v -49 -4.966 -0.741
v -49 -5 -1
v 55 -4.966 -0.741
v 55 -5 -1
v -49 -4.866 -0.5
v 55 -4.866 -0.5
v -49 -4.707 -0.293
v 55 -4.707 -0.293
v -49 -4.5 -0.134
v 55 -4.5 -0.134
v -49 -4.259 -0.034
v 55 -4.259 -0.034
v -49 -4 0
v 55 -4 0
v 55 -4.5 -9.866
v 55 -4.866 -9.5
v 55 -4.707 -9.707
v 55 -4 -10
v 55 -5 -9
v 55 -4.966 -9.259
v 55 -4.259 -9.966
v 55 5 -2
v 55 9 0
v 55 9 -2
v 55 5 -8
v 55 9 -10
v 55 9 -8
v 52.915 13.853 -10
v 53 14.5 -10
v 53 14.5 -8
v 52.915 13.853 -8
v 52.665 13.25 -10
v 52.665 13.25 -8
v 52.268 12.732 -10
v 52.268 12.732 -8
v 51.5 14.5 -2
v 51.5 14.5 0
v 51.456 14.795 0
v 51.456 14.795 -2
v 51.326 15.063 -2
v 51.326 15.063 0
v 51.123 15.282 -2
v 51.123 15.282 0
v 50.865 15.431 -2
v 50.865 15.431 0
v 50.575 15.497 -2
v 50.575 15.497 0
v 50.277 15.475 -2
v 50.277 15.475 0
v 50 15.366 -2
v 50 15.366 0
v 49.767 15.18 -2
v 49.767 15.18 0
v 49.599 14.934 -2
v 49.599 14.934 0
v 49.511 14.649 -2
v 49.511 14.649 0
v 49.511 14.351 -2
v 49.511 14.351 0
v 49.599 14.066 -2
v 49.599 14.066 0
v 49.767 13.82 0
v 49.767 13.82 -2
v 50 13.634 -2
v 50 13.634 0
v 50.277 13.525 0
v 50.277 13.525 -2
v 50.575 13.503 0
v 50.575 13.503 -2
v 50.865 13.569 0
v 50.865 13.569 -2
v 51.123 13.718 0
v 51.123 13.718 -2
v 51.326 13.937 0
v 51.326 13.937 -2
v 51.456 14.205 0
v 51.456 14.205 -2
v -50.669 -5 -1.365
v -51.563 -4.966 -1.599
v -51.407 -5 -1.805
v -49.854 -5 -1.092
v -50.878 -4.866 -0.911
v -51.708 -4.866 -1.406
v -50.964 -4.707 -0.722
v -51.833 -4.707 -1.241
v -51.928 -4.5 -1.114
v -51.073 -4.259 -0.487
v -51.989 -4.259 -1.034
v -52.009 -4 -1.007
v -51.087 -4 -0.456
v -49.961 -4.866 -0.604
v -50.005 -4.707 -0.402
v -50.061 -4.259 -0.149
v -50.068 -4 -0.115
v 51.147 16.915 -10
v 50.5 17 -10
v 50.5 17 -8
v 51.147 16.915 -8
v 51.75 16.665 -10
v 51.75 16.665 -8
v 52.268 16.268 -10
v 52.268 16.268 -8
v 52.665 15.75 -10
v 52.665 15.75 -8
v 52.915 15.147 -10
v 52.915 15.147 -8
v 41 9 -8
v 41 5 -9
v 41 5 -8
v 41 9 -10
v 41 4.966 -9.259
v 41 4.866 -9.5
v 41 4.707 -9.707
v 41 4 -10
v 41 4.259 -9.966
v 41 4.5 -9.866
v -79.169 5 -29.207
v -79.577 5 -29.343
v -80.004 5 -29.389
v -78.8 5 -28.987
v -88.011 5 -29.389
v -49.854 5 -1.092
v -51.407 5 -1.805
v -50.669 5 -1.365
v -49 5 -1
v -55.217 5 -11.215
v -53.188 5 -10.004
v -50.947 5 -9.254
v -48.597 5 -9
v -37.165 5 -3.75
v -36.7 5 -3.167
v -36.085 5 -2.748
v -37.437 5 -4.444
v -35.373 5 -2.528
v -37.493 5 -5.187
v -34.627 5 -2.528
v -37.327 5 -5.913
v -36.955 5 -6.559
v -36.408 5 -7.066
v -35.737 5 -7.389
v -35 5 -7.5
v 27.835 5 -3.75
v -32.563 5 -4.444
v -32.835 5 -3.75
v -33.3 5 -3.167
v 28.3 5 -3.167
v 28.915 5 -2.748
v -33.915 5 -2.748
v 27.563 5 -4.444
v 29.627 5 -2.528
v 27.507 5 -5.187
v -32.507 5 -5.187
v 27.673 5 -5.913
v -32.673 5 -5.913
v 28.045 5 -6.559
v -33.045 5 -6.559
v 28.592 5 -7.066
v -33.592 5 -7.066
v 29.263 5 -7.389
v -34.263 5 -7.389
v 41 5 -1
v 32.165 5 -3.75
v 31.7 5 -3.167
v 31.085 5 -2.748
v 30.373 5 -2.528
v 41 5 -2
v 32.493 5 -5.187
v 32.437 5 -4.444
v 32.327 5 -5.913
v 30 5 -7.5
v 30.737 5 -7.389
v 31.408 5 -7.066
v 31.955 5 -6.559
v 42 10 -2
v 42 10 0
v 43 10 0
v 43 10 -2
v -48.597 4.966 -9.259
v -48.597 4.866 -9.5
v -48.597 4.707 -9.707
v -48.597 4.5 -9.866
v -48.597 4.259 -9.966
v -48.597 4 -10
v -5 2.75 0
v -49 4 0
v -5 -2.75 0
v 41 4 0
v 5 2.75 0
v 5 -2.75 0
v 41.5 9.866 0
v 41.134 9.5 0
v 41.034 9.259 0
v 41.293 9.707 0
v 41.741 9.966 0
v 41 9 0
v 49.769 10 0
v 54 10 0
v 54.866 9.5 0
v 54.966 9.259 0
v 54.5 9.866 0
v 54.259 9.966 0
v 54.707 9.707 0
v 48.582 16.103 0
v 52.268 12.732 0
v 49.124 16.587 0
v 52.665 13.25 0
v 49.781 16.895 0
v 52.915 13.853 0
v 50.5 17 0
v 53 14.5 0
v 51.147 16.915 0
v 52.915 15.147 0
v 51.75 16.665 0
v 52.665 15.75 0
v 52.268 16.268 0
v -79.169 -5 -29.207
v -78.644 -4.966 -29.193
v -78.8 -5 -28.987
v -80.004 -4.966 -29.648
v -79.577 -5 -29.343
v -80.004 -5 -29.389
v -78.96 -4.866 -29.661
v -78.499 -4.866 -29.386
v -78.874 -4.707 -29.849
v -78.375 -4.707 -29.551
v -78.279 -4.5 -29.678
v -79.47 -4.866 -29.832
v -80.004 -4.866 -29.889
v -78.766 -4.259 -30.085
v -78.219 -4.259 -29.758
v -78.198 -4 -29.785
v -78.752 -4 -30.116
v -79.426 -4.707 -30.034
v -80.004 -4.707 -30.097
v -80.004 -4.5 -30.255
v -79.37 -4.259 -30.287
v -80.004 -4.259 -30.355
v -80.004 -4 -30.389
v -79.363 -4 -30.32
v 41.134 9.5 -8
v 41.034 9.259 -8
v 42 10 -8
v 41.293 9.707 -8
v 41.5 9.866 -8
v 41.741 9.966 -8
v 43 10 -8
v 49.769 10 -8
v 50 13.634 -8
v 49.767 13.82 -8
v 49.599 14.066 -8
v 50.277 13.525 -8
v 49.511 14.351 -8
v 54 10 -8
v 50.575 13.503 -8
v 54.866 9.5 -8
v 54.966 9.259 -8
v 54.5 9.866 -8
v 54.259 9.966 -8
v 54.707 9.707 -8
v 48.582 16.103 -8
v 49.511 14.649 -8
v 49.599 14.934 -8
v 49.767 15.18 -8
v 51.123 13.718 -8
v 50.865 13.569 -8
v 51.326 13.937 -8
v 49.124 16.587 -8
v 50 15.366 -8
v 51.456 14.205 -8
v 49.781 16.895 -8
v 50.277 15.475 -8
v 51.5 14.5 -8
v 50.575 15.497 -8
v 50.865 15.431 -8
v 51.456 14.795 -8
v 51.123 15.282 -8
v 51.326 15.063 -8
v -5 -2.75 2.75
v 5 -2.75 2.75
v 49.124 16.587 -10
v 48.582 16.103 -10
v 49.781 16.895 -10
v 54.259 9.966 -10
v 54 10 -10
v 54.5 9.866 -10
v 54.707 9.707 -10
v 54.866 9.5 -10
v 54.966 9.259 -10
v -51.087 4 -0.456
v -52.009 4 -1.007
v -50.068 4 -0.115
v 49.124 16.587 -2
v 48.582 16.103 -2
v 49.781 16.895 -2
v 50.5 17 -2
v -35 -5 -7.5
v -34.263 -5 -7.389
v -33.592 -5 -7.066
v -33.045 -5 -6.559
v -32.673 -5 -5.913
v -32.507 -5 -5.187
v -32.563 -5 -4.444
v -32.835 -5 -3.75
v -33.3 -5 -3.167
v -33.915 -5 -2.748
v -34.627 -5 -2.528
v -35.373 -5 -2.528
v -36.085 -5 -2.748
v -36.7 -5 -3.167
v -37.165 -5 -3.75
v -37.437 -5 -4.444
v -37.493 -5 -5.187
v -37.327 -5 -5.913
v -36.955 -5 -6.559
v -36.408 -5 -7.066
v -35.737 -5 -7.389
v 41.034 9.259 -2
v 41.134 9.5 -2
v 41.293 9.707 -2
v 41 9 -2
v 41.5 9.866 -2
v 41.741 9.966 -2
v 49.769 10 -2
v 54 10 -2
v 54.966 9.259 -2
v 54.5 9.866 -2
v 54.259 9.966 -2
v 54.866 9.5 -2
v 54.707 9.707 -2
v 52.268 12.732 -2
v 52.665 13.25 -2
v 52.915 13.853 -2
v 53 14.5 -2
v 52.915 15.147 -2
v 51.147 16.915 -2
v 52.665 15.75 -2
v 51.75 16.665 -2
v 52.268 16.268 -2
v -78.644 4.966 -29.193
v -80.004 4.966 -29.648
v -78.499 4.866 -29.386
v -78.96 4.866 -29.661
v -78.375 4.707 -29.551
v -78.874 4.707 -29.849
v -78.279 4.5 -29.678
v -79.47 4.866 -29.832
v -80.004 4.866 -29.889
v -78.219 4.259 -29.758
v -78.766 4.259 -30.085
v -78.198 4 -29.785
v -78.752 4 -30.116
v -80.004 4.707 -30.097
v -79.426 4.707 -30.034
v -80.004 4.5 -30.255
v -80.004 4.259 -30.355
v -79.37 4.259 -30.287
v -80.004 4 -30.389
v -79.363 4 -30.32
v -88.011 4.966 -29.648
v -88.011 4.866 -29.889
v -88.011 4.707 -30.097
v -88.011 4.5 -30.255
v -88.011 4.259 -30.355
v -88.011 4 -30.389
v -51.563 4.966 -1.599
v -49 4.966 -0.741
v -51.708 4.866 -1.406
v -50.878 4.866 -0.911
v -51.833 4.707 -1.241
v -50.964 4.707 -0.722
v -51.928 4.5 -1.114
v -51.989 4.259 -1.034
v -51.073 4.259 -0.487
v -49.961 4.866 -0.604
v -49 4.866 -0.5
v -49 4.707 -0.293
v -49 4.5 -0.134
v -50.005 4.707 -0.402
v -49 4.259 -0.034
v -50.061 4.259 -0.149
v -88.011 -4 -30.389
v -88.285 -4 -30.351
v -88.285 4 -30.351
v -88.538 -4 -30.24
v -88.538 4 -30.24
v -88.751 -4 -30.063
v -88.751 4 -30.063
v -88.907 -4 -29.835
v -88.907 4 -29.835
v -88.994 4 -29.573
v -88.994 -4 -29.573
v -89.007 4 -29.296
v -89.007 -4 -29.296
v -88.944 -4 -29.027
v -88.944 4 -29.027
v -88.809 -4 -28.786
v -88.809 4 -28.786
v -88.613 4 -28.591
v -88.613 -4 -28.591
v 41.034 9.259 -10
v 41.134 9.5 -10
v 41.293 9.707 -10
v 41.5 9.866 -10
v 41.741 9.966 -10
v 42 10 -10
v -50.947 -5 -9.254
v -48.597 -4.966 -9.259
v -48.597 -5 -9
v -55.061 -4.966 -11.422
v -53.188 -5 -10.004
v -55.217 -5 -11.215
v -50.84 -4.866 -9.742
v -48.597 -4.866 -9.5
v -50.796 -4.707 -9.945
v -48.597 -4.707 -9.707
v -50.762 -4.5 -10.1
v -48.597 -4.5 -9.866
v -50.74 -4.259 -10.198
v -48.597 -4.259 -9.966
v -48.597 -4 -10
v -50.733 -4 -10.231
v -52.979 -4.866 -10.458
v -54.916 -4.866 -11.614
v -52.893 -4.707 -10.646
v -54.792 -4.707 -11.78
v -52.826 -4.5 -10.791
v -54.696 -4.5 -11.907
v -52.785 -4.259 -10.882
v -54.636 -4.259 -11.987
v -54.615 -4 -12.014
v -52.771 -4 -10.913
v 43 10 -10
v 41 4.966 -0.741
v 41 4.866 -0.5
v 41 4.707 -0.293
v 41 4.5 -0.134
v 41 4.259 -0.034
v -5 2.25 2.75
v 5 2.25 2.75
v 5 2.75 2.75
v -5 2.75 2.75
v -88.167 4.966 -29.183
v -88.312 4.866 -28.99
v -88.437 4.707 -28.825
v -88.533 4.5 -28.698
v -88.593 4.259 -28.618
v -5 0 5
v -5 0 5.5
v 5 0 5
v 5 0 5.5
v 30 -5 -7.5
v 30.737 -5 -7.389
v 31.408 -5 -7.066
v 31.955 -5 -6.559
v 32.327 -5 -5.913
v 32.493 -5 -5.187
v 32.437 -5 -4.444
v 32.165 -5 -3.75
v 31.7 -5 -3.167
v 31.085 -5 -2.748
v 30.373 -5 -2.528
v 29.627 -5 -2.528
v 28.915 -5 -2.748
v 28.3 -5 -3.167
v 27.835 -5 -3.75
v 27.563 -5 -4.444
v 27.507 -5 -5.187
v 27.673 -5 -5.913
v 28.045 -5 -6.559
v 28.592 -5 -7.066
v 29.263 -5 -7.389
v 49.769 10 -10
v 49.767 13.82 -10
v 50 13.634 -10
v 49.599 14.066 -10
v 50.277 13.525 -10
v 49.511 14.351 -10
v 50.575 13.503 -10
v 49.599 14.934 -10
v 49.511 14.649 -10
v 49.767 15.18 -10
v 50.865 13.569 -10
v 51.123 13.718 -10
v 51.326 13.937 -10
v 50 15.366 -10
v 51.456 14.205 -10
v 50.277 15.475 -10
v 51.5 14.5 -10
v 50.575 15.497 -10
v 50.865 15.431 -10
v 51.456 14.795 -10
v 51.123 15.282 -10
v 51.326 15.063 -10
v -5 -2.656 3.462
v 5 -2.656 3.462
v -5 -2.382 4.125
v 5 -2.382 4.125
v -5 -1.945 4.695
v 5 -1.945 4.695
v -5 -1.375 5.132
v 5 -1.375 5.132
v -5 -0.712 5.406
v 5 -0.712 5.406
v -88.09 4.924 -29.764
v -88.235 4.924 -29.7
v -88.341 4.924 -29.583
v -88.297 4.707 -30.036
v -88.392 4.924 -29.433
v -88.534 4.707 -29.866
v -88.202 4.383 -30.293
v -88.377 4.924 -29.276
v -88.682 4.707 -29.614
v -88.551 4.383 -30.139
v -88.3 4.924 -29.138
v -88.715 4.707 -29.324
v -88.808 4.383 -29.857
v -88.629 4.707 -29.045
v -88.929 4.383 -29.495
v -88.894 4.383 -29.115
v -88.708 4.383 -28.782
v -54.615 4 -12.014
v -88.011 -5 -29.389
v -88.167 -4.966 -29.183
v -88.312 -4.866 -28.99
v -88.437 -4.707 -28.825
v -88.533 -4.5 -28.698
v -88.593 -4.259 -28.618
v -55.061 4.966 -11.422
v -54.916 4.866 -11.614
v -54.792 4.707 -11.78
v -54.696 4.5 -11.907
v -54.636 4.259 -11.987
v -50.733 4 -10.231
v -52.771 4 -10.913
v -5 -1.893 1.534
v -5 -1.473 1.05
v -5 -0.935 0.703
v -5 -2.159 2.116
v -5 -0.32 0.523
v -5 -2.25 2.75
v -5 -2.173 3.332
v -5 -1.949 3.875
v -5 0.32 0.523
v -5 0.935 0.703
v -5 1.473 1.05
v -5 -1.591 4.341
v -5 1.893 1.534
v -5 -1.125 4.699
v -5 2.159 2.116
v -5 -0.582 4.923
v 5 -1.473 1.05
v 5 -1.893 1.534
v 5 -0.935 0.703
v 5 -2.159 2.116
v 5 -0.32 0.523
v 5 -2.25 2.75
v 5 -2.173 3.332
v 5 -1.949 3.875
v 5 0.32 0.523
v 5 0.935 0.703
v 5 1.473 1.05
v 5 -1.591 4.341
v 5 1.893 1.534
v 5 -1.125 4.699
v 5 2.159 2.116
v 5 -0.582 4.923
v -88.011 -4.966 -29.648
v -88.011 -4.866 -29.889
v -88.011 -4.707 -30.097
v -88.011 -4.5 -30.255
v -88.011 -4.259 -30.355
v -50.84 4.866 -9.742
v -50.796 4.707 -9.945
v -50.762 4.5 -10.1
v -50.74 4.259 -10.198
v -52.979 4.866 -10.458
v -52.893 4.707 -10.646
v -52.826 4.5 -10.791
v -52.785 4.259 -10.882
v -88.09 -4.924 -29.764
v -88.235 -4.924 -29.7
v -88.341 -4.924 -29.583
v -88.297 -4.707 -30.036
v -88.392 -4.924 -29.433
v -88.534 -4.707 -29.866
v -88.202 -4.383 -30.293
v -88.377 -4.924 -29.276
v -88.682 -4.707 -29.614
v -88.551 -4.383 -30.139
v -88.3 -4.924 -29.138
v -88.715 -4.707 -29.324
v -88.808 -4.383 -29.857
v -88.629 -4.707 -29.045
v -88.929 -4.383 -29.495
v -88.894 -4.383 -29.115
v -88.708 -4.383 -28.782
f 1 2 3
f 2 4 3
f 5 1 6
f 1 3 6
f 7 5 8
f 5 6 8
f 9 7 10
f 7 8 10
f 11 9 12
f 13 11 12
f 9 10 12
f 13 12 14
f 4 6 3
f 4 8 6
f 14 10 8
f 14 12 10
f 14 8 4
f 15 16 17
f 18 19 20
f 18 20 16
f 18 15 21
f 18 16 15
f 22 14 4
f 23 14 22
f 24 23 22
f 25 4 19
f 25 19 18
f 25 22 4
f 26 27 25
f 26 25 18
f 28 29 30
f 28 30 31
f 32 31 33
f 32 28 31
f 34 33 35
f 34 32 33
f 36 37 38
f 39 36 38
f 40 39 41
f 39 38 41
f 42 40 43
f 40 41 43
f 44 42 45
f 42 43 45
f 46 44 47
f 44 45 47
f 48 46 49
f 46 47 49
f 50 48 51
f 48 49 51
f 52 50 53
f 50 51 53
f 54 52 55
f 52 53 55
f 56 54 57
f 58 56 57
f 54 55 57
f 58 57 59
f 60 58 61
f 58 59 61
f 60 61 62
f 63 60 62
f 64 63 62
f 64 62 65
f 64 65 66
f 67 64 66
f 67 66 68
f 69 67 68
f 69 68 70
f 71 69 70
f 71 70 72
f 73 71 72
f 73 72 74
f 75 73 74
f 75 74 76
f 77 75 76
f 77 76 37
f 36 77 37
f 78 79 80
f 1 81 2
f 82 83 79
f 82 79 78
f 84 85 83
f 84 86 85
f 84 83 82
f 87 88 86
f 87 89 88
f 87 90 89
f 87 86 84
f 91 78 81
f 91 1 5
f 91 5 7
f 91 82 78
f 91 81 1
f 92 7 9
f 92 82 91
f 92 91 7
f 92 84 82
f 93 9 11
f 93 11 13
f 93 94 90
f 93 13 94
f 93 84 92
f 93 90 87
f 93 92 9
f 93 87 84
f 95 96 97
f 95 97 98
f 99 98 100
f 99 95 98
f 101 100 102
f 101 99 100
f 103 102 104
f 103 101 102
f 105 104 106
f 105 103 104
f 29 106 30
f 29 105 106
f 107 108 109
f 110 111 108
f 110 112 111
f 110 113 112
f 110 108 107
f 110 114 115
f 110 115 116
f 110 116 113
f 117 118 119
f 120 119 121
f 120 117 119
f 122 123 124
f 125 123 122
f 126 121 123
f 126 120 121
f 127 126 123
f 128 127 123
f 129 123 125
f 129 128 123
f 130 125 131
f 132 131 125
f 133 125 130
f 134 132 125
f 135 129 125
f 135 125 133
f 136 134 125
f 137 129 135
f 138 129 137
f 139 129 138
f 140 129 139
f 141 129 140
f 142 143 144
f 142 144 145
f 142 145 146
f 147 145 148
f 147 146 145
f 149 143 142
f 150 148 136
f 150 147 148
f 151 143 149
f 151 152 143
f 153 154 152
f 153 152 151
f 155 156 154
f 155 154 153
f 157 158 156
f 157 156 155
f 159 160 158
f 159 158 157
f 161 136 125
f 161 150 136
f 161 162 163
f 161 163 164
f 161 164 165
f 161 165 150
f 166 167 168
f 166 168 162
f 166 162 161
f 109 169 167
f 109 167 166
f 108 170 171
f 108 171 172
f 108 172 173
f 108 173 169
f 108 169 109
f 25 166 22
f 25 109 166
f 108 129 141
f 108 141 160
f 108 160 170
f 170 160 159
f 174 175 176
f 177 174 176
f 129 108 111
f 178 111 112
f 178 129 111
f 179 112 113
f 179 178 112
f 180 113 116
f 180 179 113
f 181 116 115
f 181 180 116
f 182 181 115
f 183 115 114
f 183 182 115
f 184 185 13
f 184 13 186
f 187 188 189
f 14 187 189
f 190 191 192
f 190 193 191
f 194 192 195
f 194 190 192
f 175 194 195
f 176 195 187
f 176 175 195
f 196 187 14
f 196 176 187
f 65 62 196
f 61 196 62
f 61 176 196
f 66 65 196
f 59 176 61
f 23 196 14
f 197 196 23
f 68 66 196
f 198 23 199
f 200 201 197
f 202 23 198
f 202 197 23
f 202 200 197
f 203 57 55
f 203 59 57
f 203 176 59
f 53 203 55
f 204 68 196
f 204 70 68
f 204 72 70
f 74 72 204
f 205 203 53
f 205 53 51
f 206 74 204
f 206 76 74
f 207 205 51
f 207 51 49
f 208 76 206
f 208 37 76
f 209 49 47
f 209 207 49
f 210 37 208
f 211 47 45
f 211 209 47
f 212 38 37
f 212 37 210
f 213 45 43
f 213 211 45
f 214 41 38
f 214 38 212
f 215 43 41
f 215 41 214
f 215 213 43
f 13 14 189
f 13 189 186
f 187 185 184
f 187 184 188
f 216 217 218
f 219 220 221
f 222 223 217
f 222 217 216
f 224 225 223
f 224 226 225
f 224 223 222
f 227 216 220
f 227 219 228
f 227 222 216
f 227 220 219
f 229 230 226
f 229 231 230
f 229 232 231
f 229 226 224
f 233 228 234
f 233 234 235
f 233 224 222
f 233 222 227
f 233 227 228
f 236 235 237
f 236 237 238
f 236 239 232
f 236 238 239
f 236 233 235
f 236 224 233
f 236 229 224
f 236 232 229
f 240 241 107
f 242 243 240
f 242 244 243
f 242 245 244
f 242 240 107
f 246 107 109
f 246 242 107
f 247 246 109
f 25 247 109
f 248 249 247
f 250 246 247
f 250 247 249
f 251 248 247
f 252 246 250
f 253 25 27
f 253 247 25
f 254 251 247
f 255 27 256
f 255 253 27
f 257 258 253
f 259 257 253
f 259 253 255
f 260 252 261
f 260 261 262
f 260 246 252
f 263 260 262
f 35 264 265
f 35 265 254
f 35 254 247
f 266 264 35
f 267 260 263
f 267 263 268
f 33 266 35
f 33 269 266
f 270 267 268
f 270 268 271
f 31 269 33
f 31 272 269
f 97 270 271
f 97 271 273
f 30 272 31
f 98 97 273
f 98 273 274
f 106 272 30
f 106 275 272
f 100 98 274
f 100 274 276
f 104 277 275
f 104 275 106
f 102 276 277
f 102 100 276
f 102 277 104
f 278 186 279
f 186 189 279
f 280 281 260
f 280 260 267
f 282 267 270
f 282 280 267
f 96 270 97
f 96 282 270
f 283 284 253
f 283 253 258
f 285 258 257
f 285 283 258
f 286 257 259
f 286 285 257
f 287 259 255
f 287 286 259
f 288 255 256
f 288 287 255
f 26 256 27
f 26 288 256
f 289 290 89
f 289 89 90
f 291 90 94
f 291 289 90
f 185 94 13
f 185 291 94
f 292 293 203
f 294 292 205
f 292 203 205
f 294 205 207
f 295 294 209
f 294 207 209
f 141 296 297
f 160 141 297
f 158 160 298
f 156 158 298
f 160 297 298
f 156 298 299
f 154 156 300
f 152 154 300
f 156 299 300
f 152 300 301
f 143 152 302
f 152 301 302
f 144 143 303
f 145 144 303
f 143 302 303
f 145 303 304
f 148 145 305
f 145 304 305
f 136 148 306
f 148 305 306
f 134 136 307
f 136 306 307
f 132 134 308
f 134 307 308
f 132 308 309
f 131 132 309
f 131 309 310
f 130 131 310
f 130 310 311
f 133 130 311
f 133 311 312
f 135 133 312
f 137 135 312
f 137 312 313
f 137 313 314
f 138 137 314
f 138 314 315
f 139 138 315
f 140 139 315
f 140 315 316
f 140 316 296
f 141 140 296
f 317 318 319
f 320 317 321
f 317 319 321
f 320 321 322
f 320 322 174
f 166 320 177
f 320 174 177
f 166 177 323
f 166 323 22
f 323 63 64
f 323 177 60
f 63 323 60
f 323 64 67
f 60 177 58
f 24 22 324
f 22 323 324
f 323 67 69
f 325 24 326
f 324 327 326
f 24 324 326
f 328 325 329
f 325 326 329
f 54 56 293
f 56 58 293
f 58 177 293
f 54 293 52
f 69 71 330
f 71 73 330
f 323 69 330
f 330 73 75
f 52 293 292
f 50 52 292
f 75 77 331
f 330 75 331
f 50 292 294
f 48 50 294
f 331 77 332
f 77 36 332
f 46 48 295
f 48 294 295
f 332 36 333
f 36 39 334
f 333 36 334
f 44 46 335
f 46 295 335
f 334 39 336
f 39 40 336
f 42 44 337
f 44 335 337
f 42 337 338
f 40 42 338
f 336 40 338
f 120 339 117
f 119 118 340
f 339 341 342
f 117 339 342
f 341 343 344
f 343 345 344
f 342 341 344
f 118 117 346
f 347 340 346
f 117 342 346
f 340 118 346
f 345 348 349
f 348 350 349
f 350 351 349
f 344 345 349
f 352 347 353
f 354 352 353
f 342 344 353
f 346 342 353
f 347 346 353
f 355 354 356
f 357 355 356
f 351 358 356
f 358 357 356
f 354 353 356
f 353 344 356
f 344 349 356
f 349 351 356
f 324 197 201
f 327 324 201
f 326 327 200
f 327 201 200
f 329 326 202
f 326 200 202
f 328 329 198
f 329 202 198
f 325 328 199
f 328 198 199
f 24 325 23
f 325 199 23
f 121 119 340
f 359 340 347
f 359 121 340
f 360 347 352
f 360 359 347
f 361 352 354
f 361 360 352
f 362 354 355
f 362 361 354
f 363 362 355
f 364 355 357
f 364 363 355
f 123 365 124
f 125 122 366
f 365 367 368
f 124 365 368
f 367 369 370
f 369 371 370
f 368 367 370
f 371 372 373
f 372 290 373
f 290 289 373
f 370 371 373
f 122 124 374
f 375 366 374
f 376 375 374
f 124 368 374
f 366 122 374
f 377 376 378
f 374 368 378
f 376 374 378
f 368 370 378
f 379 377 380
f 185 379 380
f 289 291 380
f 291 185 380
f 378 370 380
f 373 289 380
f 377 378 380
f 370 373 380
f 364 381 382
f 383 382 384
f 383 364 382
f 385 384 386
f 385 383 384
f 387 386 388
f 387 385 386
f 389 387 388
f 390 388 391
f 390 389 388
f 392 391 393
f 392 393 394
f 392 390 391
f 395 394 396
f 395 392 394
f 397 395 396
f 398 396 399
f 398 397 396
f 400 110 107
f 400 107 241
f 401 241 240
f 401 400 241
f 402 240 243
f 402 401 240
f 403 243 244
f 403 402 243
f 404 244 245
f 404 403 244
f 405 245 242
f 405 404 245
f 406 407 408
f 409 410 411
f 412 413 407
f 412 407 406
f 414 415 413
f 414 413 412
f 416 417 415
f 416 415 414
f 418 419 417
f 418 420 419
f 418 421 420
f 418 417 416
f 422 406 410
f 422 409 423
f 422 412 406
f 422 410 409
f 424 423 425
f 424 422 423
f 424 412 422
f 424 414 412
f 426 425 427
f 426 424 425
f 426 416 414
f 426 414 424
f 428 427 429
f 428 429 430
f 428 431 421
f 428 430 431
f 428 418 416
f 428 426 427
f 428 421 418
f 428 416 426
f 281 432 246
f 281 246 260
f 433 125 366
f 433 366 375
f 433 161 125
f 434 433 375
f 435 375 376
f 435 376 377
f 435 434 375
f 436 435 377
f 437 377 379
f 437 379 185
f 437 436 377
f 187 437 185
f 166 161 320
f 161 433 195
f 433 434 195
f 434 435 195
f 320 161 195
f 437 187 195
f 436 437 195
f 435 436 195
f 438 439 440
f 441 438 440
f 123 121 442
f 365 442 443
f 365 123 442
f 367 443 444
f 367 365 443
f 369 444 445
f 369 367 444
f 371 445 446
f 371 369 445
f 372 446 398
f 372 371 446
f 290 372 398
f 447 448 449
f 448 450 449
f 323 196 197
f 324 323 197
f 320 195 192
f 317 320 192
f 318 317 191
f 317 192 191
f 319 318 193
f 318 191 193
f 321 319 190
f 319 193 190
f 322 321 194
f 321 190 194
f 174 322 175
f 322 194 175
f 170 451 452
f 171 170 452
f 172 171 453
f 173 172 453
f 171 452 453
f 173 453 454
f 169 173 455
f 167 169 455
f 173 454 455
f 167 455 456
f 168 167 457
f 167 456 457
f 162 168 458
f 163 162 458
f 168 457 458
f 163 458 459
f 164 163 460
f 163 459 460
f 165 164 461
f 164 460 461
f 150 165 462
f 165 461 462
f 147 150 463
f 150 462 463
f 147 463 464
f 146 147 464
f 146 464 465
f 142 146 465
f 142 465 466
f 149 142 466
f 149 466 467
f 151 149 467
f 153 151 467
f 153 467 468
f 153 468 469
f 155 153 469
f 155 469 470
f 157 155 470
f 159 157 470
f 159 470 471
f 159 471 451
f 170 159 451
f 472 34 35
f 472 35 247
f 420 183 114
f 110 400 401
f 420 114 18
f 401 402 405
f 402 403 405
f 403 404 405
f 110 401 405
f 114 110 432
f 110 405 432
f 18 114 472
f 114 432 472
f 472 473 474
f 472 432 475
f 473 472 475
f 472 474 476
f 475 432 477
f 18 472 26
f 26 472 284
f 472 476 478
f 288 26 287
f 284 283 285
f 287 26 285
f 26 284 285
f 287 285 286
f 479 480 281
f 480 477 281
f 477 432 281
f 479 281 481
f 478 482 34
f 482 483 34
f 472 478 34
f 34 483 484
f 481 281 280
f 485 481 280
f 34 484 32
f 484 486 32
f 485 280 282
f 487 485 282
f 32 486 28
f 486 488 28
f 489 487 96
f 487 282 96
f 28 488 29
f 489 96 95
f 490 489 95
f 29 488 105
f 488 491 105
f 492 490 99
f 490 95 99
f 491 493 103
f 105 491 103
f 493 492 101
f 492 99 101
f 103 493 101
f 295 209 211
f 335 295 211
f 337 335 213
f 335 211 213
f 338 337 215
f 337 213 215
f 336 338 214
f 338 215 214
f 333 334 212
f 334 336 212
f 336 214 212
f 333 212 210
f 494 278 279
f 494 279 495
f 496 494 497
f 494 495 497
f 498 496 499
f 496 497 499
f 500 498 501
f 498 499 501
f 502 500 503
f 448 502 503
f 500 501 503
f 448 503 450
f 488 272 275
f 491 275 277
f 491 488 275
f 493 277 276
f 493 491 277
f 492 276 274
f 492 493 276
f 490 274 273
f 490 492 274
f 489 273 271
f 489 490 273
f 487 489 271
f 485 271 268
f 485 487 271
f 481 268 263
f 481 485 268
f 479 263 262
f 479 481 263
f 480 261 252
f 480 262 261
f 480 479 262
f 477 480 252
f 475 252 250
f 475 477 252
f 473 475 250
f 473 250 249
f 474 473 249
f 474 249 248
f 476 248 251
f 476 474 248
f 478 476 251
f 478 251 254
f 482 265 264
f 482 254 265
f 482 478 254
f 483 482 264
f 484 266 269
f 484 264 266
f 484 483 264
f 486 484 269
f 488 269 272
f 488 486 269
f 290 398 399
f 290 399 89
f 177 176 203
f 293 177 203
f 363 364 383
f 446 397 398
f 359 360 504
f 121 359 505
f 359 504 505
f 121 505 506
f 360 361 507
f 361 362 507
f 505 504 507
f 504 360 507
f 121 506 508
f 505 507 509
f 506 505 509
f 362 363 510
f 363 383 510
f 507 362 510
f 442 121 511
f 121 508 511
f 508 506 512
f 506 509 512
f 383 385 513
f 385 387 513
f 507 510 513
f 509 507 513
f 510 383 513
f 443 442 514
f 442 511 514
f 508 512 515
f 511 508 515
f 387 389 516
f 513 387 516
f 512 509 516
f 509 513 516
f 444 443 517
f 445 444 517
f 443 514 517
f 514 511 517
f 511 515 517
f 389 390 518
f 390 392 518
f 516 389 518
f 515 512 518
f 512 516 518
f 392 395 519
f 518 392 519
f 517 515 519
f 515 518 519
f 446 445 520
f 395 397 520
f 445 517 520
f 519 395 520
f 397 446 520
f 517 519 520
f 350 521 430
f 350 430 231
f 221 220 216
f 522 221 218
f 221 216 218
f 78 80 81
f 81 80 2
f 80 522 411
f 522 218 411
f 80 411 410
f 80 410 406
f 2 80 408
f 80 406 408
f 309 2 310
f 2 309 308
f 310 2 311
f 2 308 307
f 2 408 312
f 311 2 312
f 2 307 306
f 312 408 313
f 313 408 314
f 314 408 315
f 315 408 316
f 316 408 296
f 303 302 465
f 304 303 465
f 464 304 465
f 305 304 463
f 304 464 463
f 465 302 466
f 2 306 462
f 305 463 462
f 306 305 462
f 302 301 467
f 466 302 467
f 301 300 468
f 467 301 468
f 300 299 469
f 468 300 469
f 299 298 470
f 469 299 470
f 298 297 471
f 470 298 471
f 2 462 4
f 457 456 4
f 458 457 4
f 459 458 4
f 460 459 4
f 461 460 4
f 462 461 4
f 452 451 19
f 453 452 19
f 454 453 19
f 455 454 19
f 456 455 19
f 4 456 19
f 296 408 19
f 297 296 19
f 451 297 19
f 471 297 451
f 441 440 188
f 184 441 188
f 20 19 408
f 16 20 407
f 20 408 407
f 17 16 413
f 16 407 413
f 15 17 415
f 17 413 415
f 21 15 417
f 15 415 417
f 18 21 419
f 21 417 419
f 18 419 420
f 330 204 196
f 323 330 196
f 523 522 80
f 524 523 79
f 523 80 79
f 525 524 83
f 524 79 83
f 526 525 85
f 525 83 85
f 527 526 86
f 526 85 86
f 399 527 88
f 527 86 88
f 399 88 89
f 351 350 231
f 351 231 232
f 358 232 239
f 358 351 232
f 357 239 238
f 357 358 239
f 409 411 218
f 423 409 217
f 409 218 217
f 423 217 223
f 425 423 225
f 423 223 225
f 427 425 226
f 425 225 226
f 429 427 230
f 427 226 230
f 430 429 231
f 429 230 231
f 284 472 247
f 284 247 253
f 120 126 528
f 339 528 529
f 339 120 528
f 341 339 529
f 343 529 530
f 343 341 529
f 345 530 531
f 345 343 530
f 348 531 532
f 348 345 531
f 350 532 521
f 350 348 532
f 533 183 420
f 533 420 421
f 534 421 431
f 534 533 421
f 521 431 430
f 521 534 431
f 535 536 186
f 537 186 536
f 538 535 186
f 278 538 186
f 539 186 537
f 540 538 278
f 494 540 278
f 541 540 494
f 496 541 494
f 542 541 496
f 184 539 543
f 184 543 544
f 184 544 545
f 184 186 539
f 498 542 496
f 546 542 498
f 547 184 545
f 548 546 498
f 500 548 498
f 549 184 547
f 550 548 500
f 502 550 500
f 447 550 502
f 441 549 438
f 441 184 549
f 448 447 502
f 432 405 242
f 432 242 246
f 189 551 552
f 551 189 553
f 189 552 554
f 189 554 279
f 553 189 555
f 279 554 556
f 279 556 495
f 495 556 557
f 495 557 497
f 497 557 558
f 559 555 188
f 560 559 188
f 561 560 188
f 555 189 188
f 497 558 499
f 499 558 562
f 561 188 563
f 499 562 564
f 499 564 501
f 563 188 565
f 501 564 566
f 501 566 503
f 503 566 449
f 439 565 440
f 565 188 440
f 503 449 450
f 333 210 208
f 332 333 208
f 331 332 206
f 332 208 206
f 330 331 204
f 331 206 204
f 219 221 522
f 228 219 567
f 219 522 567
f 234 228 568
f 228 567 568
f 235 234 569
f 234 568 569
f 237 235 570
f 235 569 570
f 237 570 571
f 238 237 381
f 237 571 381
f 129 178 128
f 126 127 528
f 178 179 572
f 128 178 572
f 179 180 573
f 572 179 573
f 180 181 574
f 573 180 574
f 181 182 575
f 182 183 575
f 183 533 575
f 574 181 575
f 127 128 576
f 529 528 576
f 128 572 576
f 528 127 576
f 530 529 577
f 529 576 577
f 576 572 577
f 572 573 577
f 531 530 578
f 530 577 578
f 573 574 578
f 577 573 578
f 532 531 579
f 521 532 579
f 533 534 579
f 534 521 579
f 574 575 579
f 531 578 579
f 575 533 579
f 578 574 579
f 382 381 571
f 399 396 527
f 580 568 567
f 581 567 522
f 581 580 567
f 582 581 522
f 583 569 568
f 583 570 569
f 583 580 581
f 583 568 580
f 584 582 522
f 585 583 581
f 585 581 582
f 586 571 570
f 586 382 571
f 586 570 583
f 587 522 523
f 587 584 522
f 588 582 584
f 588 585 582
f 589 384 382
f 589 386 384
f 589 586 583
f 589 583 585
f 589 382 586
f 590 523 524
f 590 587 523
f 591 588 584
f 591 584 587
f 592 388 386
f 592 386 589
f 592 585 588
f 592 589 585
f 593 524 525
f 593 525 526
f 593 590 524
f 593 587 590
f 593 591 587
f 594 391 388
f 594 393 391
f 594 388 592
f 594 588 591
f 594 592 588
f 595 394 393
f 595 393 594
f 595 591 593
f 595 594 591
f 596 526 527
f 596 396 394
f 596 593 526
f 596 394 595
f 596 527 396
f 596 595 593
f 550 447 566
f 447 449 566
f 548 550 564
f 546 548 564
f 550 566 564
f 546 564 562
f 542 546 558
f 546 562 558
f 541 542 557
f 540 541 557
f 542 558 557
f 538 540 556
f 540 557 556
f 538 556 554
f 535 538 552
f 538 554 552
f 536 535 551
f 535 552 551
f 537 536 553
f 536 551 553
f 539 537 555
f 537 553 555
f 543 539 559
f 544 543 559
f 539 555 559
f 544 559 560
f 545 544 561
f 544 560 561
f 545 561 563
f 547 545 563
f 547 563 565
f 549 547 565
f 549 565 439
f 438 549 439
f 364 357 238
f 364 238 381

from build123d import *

# Parameters (mm, degrees)
BOSS_EXTRUDE2_DEPTH = 5
SKETCH3_W           = 14
SKETCH3_H           = 5
SKETCH3_W_2         = 10
SKETCH3_H_2         = 7
BOSS_EXTRUDE3_DEPTH = 2
SKETCH4_R           = 1
CUT_EXTRUDE1_DEPTH  = 96.580030811
FILLET1_R           = 1
FILLET2_R           = 1
SKETCH5_R           = 2.5
CUT_EXTRUDE2_DEPTH  = 97.594732206
BOSS_EXTRUDE4_DEPTH = 5


with BuildPart() as part:
    # Sketch1 → Boss-Extrude2 (new, symmetric)
    with BuildSketch(Plane(origin=(0, 0, 0), x_dir=(1, 0, 0), z_dir=(0, 1, 0))):
        with BuildLine():
            Line((-49, 0), (49, 0))
            Line((49, 0), (55, 0))
            Line((55, 0), (55, 10))
            Line((55, 10), (49, 10))
            Line((49, 10), (-48.597064799, 10))
            ThreePointArc((-48.597064799, 10), (-51.770174838, 10.516784686), (-54.615321941, 12.013725463))
            Line((-54.615321941, 12.013725463), (-78.198331144, 29.785292532))
            ThreePointArc((-78.198331144, 29.785292532), (-79.051875275, 30.234374765), (-80.003808287, 30.389410171))
            Line((-80.003808287, 30.389410171), (-88.011381516, 30.389410171))
            ThreePointArc((-88.011381516, 30.389410171), (-88.959703047, 29.706721175), (-88.61320723, 28.590782717))
            Line((-88.61320723, 28.590782717), (-52.009128571, 1.006862732))
            ThreePointArc((-52.009128571, 1.006862732), (-50.586555019, 0.258392343), (-49, 0))
        make_face()
    extrude(amount=BOSS_EXTRUDE2_DEPTH, both=True)

    # Sketch3 → Boss-Extrude3 (add)
    with BuildSketch(Plane.XY):
        with Locations((48, 7.5)):
            Rectangle(SKETCH3_W, SKETCH3_H)
        with Locations((48, 13.5)):
            Rectangle(SKETCH3_W_2, SKETCH3_H_2)
    boss_extrude3 = extrude(amount=-BOSS_EXTRUDE3_DEPTH)

    # Sketch4 → Cut-Extrude1 (cut, through all)
    with BuildSketch(Plane.XY):
        with BuildLine():
            ThreePointArc((41, 9), (41.292893219, 9.707106781), (42, 10))
            Line((42, 10), (41, 10))
            Line((41, 10), (41, 9))
        make_face()
        with BuildLine():
            Line((43, 17), (43, 10))
            Line((43, 10), (48.581791004, 16.103269862))
            ThreePointArc((48.581791004, 16.103269862), (49.441268366, 16.764748844), (50.5, 17))
            Line((50.5, 17), (43, 17))
        make_face()
        with BuildLine():
            Line((52.267766953, 12.732233047), (49.768982827, 10))
            Line((49.768982827, 10), (53, 10))
            Line((53, 10), (53, 14.5))
            ThreePointArc((53, 14.5), (52.809698831, 13.543291419), (52.267766953, 12.732233047))
        make_face()
        with BuildLine():
            Line((53, 17), (50.5, 17))
            ThreePointArc((50.5, 17), (52.267766953, 16.267766953), (53, 14.5))
            Line((53, 14.5), (53, 17))
        make_face()
        with BuildLine():
            Line((55, 10), (54, 10))
            ThreePointArc((54, 10), (54.707106781, 9.707106781), (55, 9))
            Line((55, 9), (55, 10))
        make_face()
        with Locations((50.5, 14.5)):
            Circle(SKETCH4_R)
    cut_extrude1 = extrude(amount=-CUT_EXTRUDE1_DEPTH, mode=Mode.SUBTRACT)

    # Mirror1: Boss-Extrude3, Cut-Extrude1 across plane
    add(boss_extrude3.mirror(Plane.XY.offset(-5)))
    add(cut_extrude1.mirror(Plane.XY.offset(-5)), mode=Mode.SUBTRACT)

    # Fillet1
    fillet1_edges = [part.edges().sort_by_distance(p)[0] for p in [
        (3, -5, 0),
        (-50.586555019, -5, -0.258392343),
        (-70.3111679, -5, -14.798822724),
        (-88.959703047, -5, -29.706721175),
        (-84.007594901, -5, -30.389410171),
        (-79.051875275, -5, -30.234374765),
        (-66.406826543, -5, -20.899508998),
        (-51.770174838, -5, -10.516784686),
        (3.2014676, -5, -10),
    ]]
    fillet(fillet1_edges, radius=FILLET1_R)

    # Fillet2
    fillet2_edges = [part.edges().sort_by_distance(p)[0] for p in [
        (-3.7985324, 5, -10),
        (-51.770174838, 5, -10.516784686),
        (-66.406826543, 5, -20.899508998),
        (-79.051875275, 5, -30.234374765),
        (-84.007594901, 5, -30.389410171),
        (-88.959703047, 5, -29.706721175),
        (-70.3111679, 5, -14.798822724),
        (-50.586555019, 5, -0.258392343),
        (-4, 5, 0),
    ]]
    fillet(fillet2_edges, radius=FILLET2_R)

    # Sketch5 → Cut-Extrude2 (cut, through all)
    with BuildSketch(Plane.XZ.offset(5)):
        with Locations(Location((-35, -5, 0), (0, 0, 270))):
            Circle(SKETCH5_R)
        with Locations(Location((30, -5, 0), (0, 0, 270))):
            Circle(SKETCH5_R)
    extrude(amount=-CUT_EXTRUDE2_DEPTH, mode=Mode.SUBTRACT)

    # Sketch8 → Boss-Extrude4 (add, symmetric)
    with BuildSketch(Plane(origin=(0, 0, 0), x_dir=(0, 0, -1), z_dir=(1, 0, 0))):
        with BuildLine():
            Line((0, 2.75), (0, -2.75))
            Line((0, -2.75), (-2.75, -2.75))
            ThreePointArc((-2.75, -2.75), (-4.694543648, -1.944543648), (-5.5, 0))
            Line((-5.5, 0), (-5, 0))
            ThreePointArc((-5, 0), (-4.340990258, -1.590990258), (-2.75, -2.25))
            ThreePointArc((-2.75, -2.25), (-0.5, 0), (-2.75, 2.25))
            Line((-2.75, 2.25), (-2.75, 2.75))
            Line((-2.75, 2.75), (0, 2.75))
        make_face()
    extrude(amount=BOSS_EXTRUDE4_DEPTH, both=True)


solid = part.part
